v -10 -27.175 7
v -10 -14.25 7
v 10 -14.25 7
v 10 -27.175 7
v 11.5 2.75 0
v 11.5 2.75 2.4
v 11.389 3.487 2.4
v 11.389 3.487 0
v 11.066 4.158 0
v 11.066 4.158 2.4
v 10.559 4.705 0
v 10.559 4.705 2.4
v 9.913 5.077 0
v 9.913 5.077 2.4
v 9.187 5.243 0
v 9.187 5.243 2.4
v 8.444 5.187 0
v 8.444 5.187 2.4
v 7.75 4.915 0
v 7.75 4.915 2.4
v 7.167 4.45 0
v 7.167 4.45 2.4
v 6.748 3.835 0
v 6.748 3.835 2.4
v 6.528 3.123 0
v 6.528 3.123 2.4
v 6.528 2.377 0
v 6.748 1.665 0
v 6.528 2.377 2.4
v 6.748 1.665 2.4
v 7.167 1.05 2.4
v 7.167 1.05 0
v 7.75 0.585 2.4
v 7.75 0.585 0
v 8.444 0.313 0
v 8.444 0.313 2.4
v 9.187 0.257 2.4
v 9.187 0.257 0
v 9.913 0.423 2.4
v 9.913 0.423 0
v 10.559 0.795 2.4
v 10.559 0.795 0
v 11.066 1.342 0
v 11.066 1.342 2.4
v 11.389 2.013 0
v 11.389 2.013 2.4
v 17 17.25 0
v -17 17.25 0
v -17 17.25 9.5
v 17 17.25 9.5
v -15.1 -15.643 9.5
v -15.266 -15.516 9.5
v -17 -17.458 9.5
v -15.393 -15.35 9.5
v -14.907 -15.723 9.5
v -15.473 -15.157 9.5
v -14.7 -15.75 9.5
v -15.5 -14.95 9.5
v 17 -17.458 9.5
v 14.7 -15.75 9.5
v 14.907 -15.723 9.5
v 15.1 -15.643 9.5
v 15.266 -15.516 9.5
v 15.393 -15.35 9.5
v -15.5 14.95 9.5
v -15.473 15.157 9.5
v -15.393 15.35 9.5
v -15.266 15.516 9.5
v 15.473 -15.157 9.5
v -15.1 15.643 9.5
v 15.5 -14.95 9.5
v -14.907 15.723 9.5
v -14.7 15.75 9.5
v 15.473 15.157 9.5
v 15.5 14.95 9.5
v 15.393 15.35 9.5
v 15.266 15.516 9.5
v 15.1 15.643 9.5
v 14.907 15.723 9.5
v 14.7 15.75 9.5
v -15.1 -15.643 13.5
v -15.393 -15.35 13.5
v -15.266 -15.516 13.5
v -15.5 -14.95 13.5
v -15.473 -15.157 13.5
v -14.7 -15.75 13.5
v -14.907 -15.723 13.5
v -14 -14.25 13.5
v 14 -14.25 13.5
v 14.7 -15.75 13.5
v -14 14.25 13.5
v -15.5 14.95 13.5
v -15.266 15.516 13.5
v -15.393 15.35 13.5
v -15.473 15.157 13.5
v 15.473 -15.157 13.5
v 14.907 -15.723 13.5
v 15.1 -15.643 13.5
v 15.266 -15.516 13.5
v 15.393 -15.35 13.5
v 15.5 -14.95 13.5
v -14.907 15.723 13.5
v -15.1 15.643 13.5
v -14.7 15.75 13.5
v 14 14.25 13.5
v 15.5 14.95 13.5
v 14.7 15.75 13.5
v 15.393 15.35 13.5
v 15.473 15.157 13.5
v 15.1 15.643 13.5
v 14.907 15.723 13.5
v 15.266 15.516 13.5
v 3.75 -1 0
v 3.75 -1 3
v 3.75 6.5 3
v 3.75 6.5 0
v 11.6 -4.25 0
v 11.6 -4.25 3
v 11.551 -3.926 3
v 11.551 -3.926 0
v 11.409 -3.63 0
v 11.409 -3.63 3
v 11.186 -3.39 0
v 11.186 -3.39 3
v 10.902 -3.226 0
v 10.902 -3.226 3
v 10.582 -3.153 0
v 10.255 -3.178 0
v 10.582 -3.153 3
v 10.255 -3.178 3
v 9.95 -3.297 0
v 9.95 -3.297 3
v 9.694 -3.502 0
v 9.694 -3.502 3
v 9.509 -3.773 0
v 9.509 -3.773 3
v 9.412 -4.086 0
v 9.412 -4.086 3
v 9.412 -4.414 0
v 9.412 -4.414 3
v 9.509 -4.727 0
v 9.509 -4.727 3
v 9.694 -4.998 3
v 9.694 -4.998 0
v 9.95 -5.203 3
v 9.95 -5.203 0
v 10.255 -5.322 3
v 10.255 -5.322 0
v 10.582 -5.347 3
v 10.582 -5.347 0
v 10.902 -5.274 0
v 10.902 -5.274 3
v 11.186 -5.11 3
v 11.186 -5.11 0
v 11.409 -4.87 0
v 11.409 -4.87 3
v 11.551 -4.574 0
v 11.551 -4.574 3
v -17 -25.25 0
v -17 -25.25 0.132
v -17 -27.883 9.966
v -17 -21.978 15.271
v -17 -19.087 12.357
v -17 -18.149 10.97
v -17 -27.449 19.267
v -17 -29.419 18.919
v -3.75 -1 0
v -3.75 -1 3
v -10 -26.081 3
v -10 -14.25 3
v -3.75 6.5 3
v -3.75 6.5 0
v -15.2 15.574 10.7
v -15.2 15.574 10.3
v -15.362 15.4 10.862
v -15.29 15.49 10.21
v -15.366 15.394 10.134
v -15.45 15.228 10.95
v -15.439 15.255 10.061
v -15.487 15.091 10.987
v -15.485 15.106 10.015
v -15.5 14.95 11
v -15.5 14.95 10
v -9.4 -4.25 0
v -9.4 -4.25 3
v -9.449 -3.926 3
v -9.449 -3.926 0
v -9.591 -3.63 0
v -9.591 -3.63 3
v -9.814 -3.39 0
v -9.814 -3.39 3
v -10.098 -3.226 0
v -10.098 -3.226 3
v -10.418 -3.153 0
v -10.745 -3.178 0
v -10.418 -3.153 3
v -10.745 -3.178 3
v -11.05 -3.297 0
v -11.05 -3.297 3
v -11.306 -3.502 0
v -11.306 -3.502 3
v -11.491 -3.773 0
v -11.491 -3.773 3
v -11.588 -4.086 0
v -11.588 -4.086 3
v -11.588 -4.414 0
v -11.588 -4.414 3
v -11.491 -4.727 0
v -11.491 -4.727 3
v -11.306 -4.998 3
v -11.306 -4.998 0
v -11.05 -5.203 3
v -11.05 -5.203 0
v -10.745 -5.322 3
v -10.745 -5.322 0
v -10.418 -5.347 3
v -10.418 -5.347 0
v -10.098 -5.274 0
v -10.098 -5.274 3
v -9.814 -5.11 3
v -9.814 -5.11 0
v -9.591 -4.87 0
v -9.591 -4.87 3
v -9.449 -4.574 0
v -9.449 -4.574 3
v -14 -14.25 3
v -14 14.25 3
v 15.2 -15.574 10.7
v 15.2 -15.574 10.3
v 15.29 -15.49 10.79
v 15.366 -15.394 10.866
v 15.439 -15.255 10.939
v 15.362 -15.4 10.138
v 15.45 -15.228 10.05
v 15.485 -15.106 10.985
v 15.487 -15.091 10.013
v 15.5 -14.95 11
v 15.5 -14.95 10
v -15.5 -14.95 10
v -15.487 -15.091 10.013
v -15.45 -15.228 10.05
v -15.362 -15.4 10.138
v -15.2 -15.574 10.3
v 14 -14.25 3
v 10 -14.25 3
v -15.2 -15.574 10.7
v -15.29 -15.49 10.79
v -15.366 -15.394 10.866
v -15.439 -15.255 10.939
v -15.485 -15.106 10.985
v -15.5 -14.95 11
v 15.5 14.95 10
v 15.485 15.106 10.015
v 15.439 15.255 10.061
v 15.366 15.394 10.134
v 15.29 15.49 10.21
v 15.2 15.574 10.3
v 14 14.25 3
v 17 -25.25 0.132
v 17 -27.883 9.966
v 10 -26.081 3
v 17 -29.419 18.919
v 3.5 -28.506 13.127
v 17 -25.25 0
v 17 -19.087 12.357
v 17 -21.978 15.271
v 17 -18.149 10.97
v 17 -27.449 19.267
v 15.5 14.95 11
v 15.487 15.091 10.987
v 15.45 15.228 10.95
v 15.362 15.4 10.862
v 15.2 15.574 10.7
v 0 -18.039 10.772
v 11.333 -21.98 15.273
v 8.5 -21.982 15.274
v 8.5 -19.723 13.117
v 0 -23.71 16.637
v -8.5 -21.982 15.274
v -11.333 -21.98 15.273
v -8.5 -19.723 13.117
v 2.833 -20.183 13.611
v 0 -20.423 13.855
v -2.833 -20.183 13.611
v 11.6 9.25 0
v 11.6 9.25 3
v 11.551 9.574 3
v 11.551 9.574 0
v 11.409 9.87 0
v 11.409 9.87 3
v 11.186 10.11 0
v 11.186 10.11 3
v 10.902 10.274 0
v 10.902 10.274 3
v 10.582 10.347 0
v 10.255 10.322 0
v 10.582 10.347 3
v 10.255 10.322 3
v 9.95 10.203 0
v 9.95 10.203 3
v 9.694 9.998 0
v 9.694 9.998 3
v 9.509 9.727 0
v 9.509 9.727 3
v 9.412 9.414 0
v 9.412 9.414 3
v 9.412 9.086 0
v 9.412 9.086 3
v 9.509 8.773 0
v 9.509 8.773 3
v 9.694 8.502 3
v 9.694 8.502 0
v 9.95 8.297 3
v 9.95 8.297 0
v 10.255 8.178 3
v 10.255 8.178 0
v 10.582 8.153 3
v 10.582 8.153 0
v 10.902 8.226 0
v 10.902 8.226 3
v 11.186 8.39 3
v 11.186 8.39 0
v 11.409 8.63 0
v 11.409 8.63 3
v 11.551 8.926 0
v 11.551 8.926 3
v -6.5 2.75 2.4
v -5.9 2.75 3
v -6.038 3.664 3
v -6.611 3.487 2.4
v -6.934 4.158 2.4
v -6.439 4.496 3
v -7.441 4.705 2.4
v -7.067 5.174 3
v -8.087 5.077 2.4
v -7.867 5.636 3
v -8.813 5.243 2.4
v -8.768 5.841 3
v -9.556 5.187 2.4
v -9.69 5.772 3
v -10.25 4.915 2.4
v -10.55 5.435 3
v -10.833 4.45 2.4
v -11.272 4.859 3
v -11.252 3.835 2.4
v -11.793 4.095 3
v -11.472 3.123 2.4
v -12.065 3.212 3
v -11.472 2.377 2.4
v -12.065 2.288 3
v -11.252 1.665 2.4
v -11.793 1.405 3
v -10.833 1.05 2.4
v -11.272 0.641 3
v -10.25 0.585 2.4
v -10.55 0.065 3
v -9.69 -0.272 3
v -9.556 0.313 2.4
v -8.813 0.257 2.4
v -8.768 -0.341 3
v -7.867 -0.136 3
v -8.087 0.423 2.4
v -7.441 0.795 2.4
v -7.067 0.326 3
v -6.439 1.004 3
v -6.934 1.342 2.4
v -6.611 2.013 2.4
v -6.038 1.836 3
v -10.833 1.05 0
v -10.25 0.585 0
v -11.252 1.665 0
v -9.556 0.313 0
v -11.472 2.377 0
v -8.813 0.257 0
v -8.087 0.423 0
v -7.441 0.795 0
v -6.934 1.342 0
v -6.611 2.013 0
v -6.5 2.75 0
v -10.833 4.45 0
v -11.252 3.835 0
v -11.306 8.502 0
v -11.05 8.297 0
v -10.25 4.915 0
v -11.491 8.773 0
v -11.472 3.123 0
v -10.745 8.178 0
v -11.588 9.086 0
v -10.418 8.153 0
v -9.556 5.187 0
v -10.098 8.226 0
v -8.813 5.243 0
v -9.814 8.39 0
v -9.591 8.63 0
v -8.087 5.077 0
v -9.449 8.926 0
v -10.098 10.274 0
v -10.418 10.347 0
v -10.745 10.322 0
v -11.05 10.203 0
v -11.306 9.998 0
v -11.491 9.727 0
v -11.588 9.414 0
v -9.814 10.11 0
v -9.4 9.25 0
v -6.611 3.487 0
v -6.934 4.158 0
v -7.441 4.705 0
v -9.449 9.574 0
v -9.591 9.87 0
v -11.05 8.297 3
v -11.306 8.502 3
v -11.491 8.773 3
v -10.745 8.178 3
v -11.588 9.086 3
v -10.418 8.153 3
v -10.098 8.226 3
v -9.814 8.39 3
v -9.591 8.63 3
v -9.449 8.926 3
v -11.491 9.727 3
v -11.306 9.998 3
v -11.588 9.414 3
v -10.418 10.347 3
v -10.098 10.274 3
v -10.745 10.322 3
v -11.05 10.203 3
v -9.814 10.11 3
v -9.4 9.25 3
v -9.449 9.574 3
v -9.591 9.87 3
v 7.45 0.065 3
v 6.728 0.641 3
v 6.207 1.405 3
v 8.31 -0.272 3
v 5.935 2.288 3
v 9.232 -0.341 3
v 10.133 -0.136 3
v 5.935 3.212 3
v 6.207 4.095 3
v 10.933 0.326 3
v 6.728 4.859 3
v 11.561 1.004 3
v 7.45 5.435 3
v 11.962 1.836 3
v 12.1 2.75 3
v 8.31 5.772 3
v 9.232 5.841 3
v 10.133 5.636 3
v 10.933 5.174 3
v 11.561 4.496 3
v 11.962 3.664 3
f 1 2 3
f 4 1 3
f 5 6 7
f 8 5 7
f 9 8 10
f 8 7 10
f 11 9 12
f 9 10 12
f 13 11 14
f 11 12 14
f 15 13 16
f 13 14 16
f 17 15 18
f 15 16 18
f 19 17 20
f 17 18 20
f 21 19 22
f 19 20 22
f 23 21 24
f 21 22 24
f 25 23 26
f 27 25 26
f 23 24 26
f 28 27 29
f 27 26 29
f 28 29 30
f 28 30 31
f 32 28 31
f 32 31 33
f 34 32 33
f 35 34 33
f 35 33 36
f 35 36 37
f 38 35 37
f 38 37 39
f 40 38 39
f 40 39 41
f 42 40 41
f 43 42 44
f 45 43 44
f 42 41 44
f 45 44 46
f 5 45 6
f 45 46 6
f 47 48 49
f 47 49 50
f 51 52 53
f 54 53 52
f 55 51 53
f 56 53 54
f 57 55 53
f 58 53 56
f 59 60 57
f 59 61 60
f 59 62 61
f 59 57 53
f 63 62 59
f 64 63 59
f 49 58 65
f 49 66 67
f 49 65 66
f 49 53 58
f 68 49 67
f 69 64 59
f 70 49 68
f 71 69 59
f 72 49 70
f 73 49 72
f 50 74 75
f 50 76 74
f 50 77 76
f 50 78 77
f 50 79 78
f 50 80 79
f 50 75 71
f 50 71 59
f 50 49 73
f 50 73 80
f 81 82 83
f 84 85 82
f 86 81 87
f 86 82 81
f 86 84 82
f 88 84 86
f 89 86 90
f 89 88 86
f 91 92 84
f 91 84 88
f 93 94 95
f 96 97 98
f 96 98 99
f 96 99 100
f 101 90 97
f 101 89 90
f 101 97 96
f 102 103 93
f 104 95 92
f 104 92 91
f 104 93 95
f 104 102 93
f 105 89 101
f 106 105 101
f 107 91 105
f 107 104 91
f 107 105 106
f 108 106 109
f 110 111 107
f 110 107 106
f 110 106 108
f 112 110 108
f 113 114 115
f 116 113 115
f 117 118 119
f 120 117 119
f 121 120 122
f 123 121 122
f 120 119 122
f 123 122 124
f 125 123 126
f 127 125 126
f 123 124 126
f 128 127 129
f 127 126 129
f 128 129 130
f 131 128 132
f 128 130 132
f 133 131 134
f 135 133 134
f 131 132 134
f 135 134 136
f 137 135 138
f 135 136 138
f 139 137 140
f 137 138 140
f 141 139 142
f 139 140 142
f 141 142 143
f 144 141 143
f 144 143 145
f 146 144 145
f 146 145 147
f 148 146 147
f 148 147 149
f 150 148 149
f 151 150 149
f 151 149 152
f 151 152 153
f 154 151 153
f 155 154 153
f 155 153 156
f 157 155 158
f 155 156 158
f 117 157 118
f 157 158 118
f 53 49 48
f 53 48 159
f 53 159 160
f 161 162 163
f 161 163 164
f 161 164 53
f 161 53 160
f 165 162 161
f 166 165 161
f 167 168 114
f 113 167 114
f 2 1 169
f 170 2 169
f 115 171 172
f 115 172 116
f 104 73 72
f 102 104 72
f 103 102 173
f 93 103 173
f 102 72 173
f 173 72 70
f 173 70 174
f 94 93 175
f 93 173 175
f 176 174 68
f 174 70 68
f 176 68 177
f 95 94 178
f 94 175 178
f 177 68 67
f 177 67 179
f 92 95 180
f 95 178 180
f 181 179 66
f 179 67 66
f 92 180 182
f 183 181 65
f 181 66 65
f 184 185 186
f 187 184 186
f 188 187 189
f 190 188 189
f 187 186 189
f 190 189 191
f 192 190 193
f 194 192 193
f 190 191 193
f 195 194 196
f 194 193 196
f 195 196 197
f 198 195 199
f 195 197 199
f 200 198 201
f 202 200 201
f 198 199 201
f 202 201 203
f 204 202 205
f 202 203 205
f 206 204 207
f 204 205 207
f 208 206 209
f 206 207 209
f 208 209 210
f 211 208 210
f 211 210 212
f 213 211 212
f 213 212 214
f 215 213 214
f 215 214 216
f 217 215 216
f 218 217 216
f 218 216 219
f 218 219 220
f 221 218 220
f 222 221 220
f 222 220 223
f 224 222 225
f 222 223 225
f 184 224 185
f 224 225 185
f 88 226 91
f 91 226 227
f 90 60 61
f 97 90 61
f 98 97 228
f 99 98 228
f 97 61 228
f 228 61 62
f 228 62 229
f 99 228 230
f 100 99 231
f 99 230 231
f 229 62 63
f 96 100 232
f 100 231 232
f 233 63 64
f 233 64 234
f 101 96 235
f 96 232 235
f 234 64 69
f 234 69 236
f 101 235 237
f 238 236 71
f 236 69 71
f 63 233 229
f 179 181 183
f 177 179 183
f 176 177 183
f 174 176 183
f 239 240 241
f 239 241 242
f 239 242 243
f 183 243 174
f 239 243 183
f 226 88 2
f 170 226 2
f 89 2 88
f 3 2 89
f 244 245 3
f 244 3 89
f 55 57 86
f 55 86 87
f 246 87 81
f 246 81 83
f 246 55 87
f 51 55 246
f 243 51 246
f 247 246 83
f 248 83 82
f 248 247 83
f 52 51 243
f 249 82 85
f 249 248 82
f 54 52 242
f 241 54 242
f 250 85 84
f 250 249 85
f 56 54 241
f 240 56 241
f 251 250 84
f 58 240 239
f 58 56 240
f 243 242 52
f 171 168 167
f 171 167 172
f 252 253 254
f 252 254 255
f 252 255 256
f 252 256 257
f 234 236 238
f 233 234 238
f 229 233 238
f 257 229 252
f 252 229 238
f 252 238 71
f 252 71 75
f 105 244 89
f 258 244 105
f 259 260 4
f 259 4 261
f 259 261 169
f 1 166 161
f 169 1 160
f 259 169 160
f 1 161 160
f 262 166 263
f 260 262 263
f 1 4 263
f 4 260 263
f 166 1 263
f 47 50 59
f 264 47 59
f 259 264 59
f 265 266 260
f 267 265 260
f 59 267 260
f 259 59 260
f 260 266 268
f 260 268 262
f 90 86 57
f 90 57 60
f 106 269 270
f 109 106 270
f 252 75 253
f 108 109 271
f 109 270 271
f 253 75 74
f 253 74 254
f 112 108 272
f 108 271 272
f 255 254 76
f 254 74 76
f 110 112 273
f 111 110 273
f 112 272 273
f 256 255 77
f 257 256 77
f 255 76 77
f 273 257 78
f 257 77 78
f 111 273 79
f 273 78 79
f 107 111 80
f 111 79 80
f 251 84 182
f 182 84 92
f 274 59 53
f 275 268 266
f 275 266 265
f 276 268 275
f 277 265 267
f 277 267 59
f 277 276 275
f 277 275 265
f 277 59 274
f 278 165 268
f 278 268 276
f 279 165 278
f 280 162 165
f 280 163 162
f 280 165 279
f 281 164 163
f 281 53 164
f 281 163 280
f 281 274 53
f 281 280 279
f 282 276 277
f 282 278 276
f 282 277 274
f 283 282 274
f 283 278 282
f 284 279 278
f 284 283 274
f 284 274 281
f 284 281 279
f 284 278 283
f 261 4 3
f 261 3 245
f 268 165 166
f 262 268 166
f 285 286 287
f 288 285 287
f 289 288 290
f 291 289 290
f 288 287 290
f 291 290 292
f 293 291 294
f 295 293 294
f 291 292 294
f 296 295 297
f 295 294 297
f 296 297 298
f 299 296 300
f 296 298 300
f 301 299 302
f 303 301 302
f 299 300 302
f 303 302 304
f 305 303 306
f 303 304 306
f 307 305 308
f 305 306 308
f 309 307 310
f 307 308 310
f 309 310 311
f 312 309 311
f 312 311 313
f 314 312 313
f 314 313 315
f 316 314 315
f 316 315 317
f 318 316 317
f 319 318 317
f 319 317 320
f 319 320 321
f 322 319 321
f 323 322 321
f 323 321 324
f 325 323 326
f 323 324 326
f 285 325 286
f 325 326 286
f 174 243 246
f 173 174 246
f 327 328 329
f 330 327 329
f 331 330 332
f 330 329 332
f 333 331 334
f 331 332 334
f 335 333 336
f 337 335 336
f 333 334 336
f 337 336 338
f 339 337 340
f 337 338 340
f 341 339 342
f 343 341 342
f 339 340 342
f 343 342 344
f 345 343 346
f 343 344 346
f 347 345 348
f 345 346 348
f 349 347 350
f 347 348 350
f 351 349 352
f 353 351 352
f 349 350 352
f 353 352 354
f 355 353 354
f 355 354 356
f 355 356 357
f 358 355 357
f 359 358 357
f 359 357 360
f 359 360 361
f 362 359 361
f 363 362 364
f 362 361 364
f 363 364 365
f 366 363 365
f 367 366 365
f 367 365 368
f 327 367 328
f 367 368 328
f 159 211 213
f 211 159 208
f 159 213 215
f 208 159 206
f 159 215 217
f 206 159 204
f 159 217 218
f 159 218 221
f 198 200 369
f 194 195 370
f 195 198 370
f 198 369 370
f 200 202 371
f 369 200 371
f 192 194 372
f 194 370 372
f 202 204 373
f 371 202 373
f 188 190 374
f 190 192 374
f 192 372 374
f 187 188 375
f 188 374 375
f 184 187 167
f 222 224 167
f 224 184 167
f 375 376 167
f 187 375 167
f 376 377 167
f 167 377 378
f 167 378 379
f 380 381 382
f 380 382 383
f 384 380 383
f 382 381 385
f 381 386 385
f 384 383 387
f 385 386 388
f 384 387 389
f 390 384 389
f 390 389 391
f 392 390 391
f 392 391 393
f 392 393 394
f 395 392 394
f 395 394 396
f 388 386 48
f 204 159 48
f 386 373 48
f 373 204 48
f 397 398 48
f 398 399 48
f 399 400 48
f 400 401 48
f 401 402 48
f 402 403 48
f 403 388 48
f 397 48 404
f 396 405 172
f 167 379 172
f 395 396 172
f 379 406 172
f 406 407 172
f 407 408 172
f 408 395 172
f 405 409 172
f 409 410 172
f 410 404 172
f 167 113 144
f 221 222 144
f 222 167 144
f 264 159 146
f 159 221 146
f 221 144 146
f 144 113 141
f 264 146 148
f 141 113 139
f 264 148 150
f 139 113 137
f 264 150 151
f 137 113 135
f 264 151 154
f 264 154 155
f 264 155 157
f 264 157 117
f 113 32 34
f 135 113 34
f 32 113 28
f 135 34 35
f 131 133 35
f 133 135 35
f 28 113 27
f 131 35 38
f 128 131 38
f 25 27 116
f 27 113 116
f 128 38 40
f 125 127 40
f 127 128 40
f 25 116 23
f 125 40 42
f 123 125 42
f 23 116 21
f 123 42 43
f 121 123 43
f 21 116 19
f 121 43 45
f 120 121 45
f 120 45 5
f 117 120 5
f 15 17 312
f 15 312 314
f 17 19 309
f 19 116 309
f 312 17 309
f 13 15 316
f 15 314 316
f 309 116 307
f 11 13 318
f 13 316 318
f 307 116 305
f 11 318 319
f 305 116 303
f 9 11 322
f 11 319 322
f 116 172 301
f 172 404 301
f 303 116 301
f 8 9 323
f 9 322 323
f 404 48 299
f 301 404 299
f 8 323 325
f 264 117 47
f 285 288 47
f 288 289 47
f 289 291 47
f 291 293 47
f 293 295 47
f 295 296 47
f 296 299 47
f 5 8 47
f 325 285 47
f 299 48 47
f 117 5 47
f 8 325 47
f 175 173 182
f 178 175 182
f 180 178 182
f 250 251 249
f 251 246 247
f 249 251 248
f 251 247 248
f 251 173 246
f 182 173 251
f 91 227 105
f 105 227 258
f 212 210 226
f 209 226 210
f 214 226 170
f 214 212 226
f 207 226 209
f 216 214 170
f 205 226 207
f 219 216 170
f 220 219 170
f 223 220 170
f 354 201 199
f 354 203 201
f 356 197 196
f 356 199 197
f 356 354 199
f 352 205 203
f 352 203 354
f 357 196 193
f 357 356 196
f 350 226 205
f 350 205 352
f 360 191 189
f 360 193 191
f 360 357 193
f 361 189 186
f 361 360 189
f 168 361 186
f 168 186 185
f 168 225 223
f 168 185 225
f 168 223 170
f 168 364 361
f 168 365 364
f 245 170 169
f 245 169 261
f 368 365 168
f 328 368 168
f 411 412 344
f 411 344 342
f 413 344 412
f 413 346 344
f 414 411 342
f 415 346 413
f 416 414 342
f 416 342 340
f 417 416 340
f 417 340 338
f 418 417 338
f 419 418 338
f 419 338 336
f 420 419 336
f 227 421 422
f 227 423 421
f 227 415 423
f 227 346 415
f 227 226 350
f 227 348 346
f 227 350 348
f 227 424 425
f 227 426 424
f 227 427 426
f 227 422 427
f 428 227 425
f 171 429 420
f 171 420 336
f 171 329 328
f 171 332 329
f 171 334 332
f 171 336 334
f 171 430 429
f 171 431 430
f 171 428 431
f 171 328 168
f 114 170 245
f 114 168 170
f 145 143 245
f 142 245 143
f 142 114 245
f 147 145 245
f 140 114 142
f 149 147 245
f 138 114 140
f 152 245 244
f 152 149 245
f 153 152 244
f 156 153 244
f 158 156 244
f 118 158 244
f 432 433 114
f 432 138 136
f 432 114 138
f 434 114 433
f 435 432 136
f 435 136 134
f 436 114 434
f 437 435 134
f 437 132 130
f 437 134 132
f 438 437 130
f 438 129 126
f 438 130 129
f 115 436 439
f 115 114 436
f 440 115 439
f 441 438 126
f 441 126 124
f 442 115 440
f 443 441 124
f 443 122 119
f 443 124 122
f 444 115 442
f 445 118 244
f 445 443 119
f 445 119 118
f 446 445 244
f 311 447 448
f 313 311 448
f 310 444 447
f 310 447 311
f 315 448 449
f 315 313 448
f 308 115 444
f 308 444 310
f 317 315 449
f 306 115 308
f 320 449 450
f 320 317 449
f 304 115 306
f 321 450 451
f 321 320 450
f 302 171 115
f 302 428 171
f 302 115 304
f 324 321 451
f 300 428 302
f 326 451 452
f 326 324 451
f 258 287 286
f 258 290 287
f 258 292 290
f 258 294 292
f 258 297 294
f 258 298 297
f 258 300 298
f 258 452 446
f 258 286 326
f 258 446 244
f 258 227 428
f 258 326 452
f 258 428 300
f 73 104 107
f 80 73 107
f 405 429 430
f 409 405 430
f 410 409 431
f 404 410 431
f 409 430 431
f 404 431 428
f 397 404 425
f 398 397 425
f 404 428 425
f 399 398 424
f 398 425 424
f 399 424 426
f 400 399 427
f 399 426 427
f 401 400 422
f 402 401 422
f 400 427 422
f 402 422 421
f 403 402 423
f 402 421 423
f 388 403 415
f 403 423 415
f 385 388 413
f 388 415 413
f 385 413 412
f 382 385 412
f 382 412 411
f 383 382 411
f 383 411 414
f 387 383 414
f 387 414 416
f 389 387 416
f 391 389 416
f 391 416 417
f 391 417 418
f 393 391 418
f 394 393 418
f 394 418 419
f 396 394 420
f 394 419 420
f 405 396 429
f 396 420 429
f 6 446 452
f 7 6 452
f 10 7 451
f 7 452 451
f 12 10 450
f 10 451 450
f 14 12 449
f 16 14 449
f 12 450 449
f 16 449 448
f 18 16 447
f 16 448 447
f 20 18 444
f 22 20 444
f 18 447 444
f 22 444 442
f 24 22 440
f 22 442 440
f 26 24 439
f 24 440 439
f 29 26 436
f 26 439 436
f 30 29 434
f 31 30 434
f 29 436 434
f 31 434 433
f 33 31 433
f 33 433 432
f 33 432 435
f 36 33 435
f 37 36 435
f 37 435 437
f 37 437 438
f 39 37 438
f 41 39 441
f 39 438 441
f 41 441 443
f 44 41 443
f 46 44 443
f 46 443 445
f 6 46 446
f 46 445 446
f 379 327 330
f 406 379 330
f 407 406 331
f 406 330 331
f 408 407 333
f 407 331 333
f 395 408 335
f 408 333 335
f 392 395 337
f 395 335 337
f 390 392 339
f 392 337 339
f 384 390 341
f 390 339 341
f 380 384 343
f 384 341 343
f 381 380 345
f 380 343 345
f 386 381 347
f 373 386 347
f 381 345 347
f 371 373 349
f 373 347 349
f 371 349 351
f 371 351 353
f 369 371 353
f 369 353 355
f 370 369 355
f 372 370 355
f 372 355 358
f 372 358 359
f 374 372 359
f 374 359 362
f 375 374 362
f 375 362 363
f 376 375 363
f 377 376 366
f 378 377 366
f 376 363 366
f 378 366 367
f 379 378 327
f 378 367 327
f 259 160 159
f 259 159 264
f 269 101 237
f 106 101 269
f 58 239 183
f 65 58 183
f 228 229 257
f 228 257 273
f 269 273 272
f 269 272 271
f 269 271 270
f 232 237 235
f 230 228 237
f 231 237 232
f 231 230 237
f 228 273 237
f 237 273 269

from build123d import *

# Parameters (mm, degrees)
SKETCH1_W           = 34
SKETCH1_H           = 34.5
BOSS_EXTRUDE2_DEPTH = 13.5
SHELL1_T            = -3
SKETCH4_R           = 1.1
SKETCH4_R_2         = 2.5
CUT_EXTRUDE2_DEPTH  = 3
CHAMFER1_SIZE       = 0.6
SKETCH5_W           = 7.5
SKETCH5_H           = 7.5
CUT_EXTRUDE4_DEPTH  = 3
SKETCH6_W           = 34
SKETCH6_H           = 34.5
SKETCH6_W_2         = 31
SKETCH6_H_2         = 31.5
CUT_EXTRUDE5_DEPTH  = 4
FILLET1_R           = 0.8
CUT_EXTRUDE6_DEPTH  = 40.5
SKETCH8_W           = 34
SKETCH8_H           = 9.5
BOSS_EXTRUDE3_DEPTH = 8
LOFT1_START         = -17
LOFT1_DEPTH         = 34
SKETCH2_W           = 20
SKETCH2_H           = 4
CUT_EXTRUDE1_DEPTH  = 15


# Read off the part's stored shape, not the designer's step: Loft1
with BuildPart() as part:
    # Sketch1 → Boss-Extrude2 (new body)
    with BuildSketch(Plane.XY):
        Rectangle(SKETCH1_W, SKETCH1_H)
    extrude(amount=BOSS_EXTRUDE2_DEPTH)

    # Shell1
    shell1_openings = [part.faces().sort_by_distance(p)[0] for p in [
        (0, 0, 13.5),
    ]]
    offset(amount=SHELL1_T, openings=shell1_openings, kind=Kind.INTERSECTION)

    # Sketch4 → Cut-Extrude2 (cut)
    with BuildSketch(Plane.XY.offset(3)):
        with Locations((-10.5, 9.25)):
            Circle(SKETCH4_R)
        with Locations((10.5, 9.25)):
            Circle(SKETCH4_R)
        with Locations((10.5, -4.25)):
            Circle(SKETCH4_R)
        with Locations((-10.5, -4.25)):
            Circle(SKETCH4_R)
        with Locations((-9, 2.75)):
            Circle(SKETCH4_R_2)
        with Locations((9, 2.75)):
            Circle(SKETCH4_R_2)
    extrude(amount=-CUT_EXTRUDE2_DEPTH, mode=Mode.SUBTRACT)

    # Chamfer1
    chamfer1_edges = [part.edges().sort_by_distance(p)[0] for p in [
        (-11.5, 2.75, 3),
        (6.5, 2.75, 3),
    ]]
    chamfer(chamfer1_edges, length=CHAMFER1_SIZE)

    # Sketch5 → Cut-Extrude4 (cut)
    with BuildSketch(Plane.XY.offset(3)):
        with Locations((0, 2.75)):
            Rectangle(SKETCH5_W, SKETCH5_H)
    extrude(amount=-CUT_EXTRUDE4_DEPTH, mode=Mode.SUBTRACT)

    # Sketch6 → Cut-Extrude5 (cut)
    with BuildSketch(Plane.XY.offset(13.5)):
        Rectangle(SKETCH6_W, SKETCH6_H)
        Rectangle(SKETCH6_W_2, SKETCH6_H_2, mode=Mode.SUBTRACT)
    extrude(amount=-CUT_EXTRUDE5_DEPTH, mode=Mode.SUBTRACT)

    # Fillet1
    fillet1_edges = [part.edges().sort_by_distance(p)[0] for p in [
        (15.5, -15.75, 11.5),
        (-15.5, -15.75, 11.5),
        (-15.5, 15.75, 11.5),
        (15.5, 15.75, 11.5),
    ]]
    fillet(fillet1_edges, radius=FILLET1_R)

    # Sketch7 → Cut-Extrude6 (cut, through all)
    with BuildSketch(Plane.XZ.offset(15.75)):
        Polygon((-15.5, 10), (-15.2, 10.3), (-15.2, 10.7), (-15.5, 11), align=None)
        Polygon((15.5, 10), (15.2, 10.3), (15.2, 10.7), (15.5, 11), align=None)
    extrude(amount=-CUT_EXTRUDE6_DEPTH, mode=Mode.SUBTRACT)

    # Sketch8 → Boss-Extrude3 (add)
    with BuildSketch(Plane.XZ.offset(17.25)):
        with Locations((0, 4.75)):
            Rectangle(SKETCH8_W, SKETCH8_H)
    extrude(amount=BOSS_EXTRUDE3_DEPTH)

    # Loft1 outline → Loft1 (add)
    with BuildSketch(Plane.YZ.offset(LOFT1_START)):
        with BuildLine():
            add(Edge.make_bspline(
                [(-27.448962768, 19.266529653), (-23.634638761, 16.661774183), (-19.340130821, 13.729106946), (-17.622252945, 9.933560294), (-17.457544345, 9.499999999)],
                knots=[0, 0, 0, 0, 0.544121998, 0.612621328, 0.612621328, 0.612621328, 0.612621328], degree=3))
            Line((-27.448962768, 19.266529653), (-29.418578274, 18.919233298))
            add(Edge.make_bspline(
                [(-29.418578274, 18.919233298), (-28.949482113, 15.724623902), (-28.092684774, 9.889716149), (-26.137682382, 3.173259559), (-25.25, 0.131617347)],
                knots=[0, 0, 0, 0, 0.544121998, 0.993830941, 0.993830941, 0.993830941, 0.993830941], degree=3))
            Line((-25.25, 0.131617347), (-25.25, 9.5))
            Line((-25.25, 9.5), (-17.457544345, 9.499999999))
        make_face()
    extrude(amount=LOFT1_DEPTH)

    # Sketch2 → Cut-Extrude1 (cut)
    with BuildSketch(Plane(origin=(0, -14.25, 0), x_dir=(1, 0, 0), z_dir=(0, 1, 0))):
        with Locations((0, -5)):
            Rectangle(SKETCH2_W, SKETCH2_H)
    extrude(amount=-CUT_EXTRUDE1_DEPTH, mode=Mode.SUBTRACT)


solid = part.part
